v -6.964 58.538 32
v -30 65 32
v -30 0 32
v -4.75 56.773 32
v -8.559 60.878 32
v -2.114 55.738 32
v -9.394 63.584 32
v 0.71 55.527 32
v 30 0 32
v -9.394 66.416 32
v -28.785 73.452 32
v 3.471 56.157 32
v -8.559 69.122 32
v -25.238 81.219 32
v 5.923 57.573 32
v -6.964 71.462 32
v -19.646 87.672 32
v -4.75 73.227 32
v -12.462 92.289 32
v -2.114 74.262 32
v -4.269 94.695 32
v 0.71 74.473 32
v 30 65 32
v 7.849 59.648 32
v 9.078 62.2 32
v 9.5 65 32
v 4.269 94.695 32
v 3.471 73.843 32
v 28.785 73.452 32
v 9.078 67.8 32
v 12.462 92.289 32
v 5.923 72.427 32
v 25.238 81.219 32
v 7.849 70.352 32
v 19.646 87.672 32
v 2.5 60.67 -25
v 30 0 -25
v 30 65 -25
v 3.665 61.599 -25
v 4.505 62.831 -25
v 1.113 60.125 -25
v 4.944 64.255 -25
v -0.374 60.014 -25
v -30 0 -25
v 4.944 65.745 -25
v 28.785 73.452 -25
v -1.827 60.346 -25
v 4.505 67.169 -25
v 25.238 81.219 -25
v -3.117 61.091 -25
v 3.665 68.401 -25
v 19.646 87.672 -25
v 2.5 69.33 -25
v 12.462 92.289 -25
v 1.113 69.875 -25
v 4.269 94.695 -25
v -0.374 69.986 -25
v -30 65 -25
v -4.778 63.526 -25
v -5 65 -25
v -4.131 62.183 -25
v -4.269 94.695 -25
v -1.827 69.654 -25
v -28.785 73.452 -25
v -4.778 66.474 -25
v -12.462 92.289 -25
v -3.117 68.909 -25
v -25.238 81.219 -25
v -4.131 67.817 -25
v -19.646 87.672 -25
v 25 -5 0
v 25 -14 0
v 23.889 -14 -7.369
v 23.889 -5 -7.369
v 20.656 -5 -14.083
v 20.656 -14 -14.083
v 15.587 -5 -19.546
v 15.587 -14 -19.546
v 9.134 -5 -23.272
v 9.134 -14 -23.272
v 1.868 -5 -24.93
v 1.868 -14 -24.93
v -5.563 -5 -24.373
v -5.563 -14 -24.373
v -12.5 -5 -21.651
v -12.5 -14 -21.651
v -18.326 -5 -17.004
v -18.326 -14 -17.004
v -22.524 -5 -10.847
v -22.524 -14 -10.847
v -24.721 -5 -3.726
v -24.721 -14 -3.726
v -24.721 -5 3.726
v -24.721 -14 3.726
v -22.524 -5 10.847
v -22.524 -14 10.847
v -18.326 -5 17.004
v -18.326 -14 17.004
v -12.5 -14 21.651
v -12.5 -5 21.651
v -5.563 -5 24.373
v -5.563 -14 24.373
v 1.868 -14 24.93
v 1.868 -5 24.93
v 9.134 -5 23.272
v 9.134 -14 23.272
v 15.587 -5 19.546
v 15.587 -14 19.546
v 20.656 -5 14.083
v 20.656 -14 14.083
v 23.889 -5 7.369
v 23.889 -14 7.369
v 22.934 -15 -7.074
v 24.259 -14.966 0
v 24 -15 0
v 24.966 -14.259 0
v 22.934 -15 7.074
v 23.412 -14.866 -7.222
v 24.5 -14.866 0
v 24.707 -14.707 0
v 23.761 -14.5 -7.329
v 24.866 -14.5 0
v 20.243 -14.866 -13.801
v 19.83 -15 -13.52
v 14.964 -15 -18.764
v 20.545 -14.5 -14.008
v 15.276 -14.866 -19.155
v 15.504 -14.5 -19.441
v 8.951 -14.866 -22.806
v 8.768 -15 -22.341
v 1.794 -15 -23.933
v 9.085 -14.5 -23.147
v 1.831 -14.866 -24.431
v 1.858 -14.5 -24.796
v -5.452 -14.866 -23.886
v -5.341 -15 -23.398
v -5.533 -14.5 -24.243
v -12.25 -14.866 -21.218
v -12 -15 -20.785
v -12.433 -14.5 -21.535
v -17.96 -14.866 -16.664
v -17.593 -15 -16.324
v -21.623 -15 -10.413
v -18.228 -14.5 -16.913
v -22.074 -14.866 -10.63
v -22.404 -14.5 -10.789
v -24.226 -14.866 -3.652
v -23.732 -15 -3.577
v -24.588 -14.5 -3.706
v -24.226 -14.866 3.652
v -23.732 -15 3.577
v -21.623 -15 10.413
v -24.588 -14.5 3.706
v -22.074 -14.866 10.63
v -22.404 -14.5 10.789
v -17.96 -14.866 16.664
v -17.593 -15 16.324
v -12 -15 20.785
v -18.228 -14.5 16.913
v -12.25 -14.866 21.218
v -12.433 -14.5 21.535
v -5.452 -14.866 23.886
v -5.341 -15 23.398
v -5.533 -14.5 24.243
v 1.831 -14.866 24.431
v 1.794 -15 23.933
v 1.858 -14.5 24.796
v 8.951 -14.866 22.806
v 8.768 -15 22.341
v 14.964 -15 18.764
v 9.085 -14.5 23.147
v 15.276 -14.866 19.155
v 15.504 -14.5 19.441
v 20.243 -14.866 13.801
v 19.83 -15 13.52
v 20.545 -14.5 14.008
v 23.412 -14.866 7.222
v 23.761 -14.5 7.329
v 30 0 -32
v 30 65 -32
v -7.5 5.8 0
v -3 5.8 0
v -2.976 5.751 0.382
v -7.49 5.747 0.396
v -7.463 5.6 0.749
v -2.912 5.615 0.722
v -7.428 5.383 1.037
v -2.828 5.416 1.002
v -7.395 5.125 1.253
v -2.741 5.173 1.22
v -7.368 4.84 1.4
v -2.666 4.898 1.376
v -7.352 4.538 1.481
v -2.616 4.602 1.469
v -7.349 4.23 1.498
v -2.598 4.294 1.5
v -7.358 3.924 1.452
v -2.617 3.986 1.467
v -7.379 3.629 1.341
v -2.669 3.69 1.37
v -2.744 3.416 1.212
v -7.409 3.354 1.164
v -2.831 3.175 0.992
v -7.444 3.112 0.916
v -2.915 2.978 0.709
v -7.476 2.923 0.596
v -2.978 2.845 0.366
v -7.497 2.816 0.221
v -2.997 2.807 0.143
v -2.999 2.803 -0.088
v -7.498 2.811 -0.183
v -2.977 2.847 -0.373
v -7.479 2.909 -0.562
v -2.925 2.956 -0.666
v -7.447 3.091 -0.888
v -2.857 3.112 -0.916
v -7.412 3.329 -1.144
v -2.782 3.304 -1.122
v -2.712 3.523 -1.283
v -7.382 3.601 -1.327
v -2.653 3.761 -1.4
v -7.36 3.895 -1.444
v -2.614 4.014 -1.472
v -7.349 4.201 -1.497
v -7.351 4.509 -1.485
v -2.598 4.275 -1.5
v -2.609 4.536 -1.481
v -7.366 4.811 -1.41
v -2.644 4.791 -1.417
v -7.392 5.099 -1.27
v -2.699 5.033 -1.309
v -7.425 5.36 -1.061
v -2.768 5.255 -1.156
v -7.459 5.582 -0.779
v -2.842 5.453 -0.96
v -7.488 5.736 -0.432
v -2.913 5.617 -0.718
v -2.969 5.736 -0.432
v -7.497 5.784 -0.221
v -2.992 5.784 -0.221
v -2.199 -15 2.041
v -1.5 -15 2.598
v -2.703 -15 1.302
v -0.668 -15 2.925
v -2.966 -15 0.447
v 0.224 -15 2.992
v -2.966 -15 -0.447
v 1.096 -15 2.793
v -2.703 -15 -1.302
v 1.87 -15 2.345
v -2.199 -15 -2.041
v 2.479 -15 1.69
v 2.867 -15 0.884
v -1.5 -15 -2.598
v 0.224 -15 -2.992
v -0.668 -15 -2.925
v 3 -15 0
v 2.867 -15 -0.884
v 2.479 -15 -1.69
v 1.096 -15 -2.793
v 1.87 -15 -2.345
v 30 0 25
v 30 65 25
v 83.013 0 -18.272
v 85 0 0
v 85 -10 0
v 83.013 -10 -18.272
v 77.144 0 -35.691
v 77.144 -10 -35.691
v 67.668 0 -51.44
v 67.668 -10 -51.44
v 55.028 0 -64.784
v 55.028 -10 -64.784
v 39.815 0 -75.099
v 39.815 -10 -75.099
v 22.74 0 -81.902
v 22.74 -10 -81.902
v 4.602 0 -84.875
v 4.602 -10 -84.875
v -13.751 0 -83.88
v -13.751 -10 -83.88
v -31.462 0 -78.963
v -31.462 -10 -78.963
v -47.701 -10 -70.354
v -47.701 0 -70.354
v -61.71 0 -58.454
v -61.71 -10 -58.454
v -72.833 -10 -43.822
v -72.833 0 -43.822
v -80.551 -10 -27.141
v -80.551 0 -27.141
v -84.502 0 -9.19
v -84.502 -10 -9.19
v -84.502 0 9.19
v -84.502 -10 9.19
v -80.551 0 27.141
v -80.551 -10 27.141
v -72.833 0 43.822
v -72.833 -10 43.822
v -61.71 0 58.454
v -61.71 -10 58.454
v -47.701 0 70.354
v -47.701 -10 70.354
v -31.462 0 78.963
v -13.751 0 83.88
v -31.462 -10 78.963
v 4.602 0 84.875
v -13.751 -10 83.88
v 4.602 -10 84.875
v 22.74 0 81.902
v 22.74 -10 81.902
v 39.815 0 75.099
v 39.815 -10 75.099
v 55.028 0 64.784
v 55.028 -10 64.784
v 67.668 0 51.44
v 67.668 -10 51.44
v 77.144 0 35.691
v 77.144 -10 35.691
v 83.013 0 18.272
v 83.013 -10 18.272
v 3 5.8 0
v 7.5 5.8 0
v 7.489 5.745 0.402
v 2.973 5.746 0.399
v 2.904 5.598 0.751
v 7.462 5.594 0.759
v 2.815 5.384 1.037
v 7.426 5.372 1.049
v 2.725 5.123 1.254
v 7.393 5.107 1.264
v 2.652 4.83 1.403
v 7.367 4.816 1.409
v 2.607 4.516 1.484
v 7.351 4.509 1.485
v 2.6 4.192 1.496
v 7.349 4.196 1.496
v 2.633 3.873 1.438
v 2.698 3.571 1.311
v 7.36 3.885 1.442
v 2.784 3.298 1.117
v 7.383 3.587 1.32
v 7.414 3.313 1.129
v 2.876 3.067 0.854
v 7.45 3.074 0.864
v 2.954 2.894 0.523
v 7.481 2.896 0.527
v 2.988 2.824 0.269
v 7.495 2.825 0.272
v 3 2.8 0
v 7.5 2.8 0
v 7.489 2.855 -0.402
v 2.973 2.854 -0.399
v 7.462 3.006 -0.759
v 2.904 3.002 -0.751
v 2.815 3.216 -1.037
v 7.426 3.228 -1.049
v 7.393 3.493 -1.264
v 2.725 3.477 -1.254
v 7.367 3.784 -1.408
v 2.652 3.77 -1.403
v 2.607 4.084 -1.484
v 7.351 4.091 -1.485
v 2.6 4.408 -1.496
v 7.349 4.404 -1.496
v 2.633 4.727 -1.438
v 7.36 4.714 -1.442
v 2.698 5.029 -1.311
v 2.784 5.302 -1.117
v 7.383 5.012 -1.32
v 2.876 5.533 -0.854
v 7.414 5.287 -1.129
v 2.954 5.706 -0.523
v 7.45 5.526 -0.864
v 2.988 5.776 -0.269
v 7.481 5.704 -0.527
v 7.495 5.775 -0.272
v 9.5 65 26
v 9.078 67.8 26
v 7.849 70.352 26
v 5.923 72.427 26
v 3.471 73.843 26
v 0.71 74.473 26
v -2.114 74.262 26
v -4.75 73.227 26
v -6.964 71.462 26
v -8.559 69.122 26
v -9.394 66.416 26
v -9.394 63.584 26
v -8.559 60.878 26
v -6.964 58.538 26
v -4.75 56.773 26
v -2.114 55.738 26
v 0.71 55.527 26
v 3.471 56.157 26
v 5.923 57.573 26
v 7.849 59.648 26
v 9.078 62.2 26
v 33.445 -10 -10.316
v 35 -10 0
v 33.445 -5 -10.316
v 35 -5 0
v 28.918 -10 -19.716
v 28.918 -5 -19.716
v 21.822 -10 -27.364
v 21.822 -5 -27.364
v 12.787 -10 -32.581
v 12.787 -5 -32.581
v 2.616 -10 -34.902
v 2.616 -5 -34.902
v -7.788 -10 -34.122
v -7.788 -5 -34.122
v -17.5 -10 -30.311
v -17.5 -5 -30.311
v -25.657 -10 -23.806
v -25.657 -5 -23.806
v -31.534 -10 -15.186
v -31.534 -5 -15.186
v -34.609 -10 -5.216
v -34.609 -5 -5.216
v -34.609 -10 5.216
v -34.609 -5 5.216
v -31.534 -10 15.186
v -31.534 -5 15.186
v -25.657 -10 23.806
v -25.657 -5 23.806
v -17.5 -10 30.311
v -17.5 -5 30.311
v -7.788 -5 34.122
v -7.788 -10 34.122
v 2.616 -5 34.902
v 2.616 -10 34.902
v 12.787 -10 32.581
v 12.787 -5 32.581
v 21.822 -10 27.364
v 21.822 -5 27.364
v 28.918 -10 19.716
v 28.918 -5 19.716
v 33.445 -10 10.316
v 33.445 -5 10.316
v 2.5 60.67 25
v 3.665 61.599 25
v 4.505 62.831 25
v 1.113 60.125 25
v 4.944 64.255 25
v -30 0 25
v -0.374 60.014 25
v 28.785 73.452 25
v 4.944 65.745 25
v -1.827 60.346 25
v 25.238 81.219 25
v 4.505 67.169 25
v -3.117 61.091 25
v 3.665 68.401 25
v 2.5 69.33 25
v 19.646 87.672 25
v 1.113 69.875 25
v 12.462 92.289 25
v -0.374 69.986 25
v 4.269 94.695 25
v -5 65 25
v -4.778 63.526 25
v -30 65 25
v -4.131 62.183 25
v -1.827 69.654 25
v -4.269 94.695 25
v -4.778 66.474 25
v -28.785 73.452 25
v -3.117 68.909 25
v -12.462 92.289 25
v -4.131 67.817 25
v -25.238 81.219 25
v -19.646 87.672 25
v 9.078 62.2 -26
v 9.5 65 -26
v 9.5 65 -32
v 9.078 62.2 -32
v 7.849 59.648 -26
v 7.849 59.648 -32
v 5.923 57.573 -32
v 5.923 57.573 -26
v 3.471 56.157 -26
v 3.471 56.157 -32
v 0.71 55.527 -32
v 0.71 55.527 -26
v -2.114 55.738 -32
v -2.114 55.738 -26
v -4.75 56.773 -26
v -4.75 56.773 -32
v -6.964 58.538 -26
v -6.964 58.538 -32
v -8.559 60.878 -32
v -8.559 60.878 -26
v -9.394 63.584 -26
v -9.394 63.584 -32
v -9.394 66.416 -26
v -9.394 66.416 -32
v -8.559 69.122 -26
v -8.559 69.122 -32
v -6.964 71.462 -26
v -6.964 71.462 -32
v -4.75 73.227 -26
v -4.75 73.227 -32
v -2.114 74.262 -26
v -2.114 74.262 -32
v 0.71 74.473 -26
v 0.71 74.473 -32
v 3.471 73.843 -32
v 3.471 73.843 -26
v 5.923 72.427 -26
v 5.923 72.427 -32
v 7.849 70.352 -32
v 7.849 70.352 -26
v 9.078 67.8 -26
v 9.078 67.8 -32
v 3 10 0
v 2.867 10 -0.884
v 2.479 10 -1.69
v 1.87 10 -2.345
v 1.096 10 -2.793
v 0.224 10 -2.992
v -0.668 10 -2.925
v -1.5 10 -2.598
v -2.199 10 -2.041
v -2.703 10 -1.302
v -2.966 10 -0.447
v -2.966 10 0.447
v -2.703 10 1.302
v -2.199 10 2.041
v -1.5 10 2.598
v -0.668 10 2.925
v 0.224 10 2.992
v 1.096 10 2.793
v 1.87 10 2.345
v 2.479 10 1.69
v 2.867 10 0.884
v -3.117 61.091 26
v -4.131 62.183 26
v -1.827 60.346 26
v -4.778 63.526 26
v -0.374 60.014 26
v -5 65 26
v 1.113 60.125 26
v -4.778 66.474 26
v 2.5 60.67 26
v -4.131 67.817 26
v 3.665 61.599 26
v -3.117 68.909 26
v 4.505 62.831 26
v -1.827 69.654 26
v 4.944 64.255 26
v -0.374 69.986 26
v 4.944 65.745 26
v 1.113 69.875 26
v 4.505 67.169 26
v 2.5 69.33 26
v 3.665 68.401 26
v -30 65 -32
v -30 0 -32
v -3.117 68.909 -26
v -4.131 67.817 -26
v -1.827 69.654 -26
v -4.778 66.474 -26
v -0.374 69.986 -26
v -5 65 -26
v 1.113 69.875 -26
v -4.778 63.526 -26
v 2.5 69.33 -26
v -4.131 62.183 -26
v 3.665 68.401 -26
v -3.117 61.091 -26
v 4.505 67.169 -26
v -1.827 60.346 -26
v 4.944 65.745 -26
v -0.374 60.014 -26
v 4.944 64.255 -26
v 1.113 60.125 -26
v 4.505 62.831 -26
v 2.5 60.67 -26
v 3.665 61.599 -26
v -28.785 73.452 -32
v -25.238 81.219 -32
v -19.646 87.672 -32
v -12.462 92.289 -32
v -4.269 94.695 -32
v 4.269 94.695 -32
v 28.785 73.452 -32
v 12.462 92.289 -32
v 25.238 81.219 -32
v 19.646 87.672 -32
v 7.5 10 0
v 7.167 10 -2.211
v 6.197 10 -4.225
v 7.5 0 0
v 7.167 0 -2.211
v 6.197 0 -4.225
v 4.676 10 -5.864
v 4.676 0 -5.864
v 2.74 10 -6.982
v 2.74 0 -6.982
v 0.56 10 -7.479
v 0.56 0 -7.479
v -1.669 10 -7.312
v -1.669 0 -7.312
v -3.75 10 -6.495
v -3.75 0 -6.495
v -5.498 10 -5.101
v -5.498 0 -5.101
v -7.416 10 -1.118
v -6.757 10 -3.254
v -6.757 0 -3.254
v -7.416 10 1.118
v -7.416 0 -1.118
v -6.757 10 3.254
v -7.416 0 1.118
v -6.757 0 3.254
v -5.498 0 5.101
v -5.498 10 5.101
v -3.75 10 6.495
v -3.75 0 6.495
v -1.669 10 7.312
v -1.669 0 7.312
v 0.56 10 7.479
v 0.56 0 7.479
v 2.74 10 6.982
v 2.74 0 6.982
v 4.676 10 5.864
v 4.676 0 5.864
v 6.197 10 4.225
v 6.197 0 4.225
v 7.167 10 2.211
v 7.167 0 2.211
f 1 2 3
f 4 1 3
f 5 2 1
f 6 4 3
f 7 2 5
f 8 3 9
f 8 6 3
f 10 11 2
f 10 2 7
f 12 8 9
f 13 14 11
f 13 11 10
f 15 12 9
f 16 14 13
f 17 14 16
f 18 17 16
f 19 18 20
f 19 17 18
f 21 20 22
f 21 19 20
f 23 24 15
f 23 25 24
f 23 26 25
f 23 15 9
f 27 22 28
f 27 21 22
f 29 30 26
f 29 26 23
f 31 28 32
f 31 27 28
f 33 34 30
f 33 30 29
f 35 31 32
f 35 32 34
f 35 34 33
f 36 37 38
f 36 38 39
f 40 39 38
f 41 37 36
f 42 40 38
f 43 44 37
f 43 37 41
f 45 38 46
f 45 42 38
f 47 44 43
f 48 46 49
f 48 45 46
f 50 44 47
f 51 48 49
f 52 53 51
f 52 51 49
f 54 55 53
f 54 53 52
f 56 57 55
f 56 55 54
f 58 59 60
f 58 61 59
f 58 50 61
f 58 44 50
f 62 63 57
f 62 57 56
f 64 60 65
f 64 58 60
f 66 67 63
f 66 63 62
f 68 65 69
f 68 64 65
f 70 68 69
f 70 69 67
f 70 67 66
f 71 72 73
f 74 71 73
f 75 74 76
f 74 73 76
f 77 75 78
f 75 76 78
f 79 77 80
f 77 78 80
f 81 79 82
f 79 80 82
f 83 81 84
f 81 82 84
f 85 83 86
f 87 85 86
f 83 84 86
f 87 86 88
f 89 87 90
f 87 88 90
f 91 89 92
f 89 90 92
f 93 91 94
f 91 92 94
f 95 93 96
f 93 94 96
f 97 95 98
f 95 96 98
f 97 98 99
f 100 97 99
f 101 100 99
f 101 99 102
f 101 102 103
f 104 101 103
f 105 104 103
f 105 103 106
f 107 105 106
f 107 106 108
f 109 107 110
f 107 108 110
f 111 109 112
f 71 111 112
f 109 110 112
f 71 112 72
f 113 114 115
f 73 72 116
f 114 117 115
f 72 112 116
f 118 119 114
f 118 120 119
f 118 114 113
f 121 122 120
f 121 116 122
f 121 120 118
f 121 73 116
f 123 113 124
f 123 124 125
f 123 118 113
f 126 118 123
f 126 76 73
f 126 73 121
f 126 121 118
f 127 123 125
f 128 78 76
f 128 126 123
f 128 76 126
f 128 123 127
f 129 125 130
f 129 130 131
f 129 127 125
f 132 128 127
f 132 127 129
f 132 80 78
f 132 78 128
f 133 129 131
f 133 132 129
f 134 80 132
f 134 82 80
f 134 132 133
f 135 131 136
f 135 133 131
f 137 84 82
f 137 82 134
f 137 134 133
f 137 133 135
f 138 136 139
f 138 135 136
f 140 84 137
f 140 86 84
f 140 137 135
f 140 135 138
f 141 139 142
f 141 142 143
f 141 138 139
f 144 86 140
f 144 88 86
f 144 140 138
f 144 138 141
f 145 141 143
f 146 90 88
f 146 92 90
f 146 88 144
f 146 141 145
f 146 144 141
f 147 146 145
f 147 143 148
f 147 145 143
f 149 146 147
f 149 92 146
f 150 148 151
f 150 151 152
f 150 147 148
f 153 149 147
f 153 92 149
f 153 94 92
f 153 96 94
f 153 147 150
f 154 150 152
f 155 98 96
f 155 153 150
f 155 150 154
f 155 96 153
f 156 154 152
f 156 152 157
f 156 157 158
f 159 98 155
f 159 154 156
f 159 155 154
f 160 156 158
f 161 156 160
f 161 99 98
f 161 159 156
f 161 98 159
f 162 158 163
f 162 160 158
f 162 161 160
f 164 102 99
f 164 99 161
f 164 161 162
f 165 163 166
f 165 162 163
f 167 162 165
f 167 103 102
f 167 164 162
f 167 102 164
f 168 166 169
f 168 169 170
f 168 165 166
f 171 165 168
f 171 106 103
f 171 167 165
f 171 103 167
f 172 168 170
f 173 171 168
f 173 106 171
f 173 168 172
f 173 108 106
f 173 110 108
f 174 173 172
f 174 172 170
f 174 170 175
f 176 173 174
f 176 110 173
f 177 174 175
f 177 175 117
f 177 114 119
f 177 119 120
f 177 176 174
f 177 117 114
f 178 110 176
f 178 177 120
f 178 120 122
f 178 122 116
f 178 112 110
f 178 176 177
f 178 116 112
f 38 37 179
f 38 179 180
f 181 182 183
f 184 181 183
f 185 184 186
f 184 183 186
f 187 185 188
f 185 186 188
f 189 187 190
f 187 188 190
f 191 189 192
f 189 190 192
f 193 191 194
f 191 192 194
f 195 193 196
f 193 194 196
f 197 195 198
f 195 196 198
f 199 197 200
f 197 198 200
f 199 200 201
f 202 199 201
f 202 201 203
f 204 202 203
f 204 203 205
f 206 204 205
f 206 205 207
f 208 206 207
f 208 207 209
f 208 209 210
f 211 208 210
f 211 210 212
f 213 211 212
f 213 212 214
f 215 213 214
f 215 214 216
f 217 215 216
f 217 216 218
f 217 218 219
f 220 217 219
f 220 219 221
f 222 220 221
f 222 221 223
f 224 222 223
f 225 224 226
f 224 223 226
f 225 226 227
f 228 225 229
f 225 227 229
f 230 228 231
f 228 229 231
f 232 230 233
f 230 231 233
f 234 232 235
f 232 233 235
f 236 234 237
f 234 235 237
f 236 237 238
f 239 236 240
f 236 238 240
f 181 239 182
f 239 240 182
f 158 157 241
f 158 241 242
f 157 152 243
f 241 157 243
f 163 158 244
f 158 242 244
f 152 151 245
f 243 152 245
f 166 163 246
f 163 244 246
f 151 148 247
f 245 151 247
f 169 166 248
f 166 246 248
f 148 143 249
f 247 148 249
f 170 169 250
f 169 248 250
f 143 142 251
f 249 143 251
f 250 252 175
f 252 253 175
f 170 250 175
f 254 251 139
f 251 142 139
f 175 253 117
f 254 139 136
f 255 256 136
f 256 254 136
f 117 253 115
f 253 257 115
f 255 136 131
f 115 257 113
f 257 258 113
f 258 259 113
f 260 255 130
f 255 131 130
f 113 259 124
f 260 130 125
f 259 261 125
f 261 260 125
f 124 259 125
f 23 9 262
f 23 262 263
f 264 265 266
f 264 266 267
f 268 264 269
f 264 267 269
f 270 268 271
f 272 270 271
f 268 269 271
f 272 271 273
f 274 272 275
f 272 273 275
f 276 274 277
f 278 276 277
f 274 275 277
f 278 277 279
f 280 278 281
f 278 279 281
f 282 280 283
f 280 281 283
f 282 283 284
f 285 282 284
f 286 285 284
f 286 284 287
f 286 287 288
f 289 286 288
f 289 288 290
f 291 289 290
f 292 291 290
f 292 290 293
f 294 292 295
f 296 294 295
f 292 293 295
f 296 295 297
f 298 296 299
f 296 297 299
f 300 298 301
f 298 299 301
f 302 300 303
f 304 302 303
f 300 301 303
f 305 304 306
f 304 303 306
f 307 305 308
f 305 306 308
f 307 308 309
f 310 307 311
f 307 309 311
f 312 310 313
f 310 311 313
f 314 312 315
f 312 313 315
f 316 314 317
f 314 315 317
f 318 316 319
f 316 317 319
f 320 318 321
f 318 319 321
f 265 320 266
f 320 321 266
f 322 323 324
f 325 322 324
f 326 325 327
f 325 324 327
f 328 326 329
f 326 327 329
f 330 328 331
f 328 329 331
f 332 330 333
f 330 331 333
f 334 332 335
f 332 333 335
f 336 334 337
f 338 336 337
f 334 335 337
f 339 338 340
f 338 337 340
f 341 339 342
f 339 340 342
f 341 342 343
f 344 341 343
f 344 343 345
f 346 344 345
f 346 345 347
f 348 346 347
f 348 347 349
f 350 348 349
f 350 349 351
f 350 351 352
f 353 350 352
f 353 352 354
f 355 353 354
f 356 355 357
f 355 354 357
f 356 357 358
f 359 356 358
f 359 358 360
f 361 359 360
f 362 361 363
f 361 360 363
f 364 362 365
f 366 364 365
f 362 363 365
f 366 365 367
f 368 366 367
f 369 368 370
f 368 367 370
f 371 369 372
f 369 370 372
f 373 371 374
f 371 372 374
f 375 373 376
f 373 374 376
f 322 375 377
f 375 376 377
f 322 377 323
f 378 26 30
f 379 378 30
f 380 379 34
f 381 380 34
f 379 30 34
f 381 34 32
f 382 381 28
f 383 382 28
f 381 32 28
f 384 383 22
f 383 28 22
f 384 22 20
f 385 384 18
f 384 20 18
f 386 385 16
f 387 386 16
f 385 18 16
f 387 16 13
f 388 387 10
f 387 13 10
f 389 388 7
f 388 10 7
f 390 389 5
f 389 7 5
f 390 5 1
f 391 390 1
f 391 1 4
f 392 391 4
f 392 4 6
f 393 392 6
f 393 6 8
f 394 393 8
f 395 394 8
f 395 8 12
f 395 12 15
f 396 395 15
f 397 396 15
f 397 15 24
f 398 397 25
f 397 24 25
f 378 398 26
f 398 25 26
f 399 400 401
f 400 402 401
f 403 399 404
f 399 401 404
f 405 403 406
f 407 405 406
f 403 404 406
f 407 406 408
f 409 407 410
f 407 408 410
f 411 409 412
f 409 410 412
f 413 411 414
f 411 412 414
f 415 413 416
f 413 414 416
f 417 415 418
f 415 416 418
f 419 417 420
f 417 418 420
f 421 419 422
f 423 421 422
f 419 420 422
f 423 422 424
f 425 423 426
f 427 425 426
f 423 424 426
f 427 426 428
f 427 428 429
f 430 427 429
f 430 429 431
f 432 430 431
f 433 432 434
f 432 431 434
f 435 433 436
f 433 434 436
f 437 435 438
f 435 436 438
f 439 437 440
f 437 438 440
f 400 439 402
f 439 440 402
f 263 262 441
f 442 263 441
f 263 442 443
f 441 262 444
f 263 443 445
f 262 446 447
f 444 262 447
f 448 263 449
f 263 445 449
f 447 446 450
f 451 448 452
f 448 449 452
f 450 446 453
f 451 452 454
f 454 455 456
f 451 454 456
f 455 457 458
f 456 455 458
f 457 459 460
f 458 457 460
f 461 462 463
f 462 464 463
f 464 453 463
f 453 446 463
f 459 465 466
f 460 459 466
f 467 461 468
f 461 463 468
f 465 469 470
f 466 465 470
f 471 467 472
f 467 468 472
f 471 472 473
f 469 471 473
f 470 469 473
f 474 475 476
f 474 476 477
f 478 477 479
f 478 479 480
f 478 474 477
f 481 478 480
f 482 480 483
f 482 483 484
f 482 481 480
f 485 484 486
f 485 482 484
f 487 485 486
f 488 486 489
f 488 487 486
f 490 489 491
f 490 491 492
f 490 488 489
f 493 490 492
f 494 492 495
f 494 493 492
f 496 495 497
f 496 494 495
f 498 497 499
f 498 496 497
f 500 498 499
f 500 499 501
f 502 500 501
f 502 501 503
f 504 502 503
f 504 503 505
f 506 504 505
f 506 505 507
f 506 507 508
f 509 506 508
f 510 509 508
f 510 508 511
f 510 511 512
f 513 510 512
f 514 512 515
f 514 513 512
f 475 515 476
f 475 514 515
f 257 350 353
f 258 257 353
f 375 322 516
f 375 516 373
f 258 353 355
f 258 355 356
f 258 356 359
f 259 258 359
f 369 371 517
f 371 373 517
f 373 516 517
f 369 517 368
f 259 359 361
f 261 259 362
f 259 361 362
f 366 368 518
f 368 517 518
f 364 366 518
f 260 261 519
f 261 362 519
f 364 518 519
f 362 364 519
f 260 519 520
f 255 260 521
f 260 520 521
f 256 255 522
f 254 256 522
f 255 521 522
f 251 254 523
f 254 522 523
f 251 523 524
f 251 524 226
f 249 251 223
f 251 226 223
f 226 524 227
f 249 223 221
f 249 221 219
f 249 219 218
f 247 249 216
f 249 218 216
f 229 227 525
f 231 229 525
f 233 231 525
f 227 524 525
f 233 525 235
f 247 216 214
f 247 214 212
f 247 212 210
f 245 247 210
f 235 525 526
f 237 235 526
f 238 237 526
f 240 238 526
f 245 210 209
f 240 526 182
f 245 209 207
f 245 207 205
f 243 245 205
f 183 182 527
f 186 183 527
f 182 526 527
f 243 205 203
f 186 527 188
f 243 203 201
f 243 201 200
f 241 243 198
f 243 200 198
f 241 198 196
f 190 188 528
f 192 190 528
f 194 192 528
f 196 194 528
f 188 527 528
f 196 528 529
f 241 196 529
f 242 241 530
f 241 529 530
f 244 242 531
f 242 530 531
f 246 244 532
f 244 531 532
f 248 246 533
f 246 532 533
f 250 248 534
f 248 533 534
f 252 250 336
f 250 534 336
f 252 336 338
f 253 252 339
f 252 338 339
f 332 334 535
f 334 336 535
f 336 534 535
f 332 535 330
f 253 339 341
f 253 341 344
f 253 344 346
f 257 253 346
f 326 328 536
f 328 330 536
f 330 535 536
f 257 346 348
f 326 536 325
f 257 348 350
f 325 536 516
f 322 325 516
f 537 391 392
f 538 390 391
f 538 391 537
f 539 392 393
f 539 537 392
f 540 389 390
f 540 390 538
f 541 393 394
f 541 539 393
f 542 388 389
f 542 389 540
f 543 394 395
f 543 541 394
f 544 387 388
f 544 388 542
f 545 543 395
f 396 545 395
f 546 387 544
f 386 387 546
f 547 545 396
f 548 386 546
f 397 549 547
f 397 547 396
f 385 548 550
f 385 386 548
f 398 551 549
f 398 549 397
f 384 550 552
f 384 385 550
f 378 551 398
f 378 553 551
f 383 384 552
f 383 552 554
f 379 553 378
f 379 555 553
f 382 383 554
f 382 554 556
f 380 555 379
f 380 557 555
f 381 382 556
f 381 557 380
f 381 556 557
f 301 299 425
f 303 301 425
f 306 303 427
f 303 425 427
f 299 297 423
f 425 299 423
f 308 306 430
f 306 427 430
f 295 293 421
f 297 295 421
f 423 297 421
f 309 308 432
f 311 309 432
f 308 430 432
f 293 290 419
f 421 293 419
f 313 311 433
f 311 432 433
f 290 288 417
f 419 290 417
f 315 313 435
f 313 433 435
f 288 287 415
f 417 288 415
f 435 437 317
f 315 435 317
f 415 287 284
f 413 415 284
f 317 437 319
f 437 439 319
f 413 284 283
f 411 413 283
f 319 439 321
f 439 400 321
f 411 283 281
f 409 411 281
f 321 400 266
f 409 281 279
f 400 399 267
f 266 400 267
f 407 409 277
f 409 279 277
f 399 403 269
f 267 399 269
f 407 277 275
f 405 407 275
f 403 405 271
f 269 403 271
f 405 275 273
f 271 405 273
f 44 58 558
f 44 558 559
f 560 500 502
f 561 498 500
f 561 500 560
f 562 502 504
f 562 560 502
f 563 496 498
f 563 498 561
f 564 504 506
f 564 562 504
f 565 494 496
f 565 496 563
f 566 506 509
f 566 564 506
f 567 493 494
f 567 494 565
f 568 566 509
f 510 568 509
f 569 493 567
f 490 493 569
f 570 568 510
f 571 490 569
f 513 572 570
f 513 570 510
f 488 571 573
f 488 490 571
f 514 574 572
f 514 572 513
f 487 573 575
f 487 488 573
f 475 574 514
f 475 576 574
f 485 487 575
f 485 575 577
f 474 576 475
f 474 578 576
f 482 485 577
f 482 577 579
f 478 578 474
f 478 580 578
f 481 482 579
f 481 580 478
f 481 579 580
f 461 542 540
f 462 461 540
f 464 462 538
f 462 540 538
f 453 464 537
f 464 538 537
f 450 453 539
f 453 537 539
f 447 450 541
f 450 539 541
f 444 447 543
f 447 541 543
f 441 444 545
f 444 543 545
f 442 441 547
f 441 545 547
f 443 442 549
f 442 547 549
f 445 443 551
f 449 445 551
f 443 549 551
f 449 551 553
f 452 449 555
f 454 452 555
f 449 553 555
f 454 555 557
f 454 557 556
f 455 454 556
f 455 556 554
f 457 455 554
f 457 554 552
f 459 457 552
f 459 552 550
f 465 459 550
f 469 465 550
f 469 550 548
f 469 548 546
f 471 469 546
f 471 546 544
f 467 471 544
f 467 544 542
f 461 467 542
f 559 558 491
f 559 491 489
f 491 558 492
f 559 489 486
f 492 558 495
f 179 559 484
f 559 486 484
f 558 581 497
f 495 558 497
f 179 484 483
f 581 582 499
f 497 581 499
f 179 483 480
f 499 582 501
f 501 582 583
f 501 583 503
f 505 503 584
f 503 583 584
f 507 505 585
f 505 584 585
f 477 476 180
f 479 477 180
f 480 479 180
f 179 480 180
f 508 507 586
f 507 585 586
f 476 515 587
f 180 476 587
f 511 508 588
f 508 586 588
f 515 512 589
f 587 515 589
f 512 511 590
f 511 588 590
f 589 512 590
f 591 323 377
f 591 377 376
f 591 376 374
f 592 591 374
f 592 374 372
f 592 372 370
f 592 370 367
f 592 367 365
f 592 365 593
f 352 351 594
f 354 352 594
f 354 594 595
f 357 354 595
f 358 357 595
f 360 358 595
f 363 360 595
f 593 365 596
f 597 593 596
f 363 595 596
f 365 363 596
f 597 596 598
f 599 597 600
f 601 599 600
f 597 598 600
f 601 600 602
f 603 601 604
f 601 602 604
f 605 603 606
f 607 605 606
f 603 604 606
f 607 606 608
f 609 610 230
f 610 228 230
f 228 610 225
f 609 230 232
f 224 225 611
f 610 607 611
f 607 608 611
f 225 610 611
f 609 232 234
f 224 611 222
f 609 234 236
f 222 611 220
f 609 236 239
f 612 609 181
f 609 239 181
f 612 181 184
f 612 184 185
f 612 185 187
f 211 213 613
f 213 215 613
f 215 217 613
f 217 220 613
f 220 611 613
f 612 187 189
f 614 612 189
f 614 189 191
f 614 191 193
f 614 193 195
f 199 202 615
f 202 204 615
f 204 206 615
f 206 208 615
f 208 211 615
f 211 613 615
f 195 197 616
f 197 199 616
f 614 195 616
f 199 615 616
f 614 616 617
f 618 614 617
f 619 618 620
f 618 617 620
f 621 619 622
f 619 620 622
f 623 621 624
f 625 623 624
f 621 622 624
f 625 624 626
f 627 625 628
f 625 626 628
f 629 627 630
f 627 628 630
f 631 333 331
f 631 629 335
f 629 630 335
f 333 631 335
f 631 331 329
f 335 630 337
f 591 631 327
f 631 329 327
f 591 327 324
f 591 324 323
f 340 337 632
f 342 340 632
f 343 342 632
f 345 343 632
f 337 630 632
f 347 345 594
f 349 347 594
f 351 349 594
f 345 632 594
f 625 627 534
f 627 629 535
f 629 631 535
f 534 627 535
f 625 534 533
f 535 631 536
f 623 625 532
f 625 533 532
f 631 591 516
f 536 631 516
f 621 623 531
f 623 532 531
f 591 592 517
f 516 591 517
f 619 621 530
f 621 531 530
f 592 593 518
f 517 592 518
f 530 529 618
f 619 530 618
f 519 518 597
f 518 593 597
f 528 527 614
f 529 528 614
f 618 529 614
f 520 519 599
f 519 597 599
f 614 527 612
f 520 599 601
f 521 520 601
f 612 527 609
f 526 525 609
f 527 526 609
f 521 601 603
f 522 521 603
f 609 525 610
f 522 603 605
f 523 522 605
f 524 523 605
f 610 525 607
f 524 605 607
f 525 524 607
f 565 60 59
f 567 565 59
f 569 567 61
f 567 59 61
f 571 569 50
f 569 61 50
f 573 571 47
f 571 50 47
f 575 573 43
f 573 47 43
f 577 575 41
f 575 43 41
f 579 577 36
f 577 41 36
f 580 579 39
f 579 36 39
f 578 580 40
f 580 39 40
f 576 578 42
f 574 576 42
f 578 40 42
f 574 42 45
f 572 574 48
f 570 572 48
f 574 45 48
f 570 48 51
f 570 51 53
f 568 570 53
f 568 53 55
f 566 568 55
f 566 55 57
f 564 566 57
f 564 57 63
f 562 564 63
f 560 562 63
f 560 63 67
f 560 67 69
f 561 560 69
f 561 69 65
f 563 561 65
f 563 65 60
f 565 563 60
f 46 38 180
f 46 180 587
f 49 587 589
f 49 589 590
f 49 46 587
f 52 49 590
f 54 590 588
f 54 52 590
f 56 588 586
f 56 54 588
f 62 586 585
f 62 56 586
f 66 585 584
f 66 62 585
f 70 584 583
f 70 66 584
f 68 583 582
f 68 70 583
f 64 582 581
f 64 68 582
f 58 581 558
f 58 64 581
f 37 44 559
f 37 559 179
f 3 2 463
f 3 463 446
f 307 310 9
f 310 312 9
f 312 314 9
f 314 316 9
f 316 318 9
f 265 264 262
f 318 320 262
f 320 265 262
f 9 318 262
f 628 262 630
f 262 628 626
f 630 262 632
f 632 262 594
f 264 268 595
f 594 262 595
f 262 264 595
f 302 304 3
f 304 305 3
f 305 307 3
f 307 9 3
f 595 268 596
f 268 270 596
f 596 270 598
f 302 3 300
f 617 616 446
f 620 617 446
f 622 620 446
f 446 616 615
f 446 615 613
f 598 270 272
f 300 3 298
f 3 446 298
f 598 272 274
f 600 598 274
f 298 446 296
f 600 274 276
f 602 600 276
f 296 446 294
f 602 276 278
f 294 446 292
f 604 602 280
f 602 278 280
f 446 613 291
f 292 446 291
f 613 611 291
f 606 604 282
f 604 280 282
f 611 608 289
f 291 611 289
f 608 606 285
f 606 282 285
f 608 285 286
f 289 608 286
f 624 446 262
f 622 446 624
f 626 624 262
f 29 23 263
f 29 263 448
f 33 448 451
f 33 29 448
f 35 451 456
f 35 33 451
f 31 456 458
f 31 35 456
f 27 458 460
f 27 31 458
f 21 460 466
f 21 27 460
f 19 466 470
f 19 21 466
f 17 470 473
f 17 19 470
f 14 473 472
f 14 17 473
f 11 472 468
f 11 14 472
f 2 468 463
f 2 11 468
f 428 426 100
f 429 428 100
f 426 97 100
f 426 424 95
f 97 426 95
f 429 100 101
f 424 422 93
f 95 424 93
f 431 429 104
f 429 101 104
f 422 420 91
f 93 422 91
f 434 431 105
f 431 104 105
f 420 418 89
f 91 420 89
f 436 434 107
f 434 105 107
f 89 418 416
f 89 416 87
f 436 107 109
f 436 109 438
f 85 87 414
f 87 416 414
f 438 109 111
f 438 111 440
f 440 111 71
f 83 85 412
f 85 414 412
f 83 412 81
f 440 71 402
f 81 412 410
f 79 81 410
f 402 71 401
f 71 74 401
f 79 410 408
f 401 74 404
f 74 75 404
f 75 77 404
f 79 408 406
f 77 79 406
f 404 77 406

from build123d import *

# Parameters (mm, degrees)
BOSS_EXTRUDE1_DEPTH = 32
SKETCH5_R           = 9.5
CUT_EXTRUDE2_DEPTH  = 6
CUT_EXTRUDE5_START  = -6
SKETCH12_R          = 9.5
CUT_EXTRUDE5_DEPTH  = 6
SKETCH8_W           = 50
SKETCH8_H           = 95
CUT_EXTRUDE3_DEPTH  = 117.828934772
SKETCH10_R          = 1.5
CUT_EXTRUDE4_DEPTH  = 158.5
FILLET1_R           = 1
SKETCH13_R          = 5
CUT_EXTRUDE6_DEPTH  = 170.02958321


with BuildPart() as part:
    # Sketch1 → Boss-Extrude1 (new, symmetric)
    with BuildSketch(Plane.XY):
        with BuildLine():
            Line((-30, 0), (30, 0))
            Line((30, 0), (30, 65))
            ThreePointArc((30, 65), (0, 95), (-30, 65))
            Line((-30, 65), (-30, 0))
        make_face()
    extrude(amount=BOSS_EXTRUDE1_DEPTH, both=True)

    # Sketch5 → Cut-Extrude2 (cut)
    with BuildSketch(Plane.XY.offset(32)):
        with Locations((0, 65)):
            Circle(SKETCH5_R)
    extrude(amount=-CUT_EXTRUDE2_DEPTH, mode=Mode.SUBTRACT)

    # Sketch12 → Cut-Extrude5 (cut)
    with BuildSketch(Plane(origin=(0, 0, -32), x_dir=(-1, 0, 0), z_dir=(0, 0, -1)).offset(CUT_EXTRUDE5_START)):
        with Locations(Location((0, 65, 0), (0, 0, 180))):
            Circle(SKETCH12_R)
    extrude(amount=CUT_EXTRUDE5_DEPTH, mode=Mode.SUBTRACT)

    # Sketch8 → Cut-Extrude3 (cut, through all)
    with BuildSketch(Plane.ZY.offset(30)):
        with Locations((0, 47.5)):
            Rectangle(SKETCH8_W, SKETCH8_H)
    extrude(amount=-CUT_EXTRUDE3_DEPTH, mode=Mode.SUBTRACT)


with BuildPart() as cut_extrude3_piece_1:
    # of the separate pieces the step leaves, piece 1, a body of its own (cut_extrude3_pieces)
    add(part.part.solids().sort_by_distance((-30, 0, 32))[0])

    # Sketch6 → Revolve1 (revolve)
    with BuildSketch(Plane.XY):
        Polygon((7.5, 0), (85, 0), (85, -10), (35, -10), (35, -5), (25, -5), (25, -15), (3, -15), (3, 10), (7.5, 10), align=None)
    revolve(axis=Axis((0, -9.444930419, 0), (0, 1, 0)))

    # Sketch10 → Cut-Extrude4 (cut, through all)
    with BuildSketch(Plane(origin=(7.5, 0, 0), x_dir=(0, 0, -1), z_dir=(1, 0, 0))):
        with Locations(Location((0, 4.3, 0), (0, 0, 90))):
            Circle(SKETCH10_R)
    extrude(amount=-CUT_EXTRUDE4_DEPTH, mode=Mode.SUBTRACT)

    # Fillet1
    fillet1_edges = [cut_extrude3_piece_1.edges().sort_by_distance(p)[0] for p in [
        (-25, -15, 0),
    ]]
    fillet(fillet1_edges, radius=FILLET1_R)


with BuildPart() as cut_extrude3_piece_2:
    # of the separate pieces the step leaves, piece 2, a body of its own (cut_extrude3_pieces)
    add(part.part.solids().sort_by_distance((-30, 0, -25))[0])


with BuildPart() as cut_extrude6_tool:
    # Sketch13 → Cut-Extrude6 (new, through all)
    with BuildSketch(Plane.XY.offset(26)):
        with Locations(Location((0, 65, 0), (0, 0, 180))):
            Circle(SKETCH13_R)
    extrude(amount=-CUT_EXTRUDE6_DEPTH)


with BuildPart() as cut_extrude3_piece_1_1:
    add(cut_extrude3_piece_1.part)

    # Cut-Extrude6: cut by cut_extrude6_tool
    add(cut_extrude6_tool.part, mode=Mode.SUBTRACT)


with BuildPart() as cut_extrude3_piece_2_1:
    add(cut_extrude3_piece_2.part)

    # Cut-Extrude6: cut by cut_extrude6_tool
    add(cut_extrude6_tool.part, mode=Mode.SUBTRACT)


solid = Compound([cut_extrude3_piece_1_1.part, cut_extrude3_piece_2_1.part])
